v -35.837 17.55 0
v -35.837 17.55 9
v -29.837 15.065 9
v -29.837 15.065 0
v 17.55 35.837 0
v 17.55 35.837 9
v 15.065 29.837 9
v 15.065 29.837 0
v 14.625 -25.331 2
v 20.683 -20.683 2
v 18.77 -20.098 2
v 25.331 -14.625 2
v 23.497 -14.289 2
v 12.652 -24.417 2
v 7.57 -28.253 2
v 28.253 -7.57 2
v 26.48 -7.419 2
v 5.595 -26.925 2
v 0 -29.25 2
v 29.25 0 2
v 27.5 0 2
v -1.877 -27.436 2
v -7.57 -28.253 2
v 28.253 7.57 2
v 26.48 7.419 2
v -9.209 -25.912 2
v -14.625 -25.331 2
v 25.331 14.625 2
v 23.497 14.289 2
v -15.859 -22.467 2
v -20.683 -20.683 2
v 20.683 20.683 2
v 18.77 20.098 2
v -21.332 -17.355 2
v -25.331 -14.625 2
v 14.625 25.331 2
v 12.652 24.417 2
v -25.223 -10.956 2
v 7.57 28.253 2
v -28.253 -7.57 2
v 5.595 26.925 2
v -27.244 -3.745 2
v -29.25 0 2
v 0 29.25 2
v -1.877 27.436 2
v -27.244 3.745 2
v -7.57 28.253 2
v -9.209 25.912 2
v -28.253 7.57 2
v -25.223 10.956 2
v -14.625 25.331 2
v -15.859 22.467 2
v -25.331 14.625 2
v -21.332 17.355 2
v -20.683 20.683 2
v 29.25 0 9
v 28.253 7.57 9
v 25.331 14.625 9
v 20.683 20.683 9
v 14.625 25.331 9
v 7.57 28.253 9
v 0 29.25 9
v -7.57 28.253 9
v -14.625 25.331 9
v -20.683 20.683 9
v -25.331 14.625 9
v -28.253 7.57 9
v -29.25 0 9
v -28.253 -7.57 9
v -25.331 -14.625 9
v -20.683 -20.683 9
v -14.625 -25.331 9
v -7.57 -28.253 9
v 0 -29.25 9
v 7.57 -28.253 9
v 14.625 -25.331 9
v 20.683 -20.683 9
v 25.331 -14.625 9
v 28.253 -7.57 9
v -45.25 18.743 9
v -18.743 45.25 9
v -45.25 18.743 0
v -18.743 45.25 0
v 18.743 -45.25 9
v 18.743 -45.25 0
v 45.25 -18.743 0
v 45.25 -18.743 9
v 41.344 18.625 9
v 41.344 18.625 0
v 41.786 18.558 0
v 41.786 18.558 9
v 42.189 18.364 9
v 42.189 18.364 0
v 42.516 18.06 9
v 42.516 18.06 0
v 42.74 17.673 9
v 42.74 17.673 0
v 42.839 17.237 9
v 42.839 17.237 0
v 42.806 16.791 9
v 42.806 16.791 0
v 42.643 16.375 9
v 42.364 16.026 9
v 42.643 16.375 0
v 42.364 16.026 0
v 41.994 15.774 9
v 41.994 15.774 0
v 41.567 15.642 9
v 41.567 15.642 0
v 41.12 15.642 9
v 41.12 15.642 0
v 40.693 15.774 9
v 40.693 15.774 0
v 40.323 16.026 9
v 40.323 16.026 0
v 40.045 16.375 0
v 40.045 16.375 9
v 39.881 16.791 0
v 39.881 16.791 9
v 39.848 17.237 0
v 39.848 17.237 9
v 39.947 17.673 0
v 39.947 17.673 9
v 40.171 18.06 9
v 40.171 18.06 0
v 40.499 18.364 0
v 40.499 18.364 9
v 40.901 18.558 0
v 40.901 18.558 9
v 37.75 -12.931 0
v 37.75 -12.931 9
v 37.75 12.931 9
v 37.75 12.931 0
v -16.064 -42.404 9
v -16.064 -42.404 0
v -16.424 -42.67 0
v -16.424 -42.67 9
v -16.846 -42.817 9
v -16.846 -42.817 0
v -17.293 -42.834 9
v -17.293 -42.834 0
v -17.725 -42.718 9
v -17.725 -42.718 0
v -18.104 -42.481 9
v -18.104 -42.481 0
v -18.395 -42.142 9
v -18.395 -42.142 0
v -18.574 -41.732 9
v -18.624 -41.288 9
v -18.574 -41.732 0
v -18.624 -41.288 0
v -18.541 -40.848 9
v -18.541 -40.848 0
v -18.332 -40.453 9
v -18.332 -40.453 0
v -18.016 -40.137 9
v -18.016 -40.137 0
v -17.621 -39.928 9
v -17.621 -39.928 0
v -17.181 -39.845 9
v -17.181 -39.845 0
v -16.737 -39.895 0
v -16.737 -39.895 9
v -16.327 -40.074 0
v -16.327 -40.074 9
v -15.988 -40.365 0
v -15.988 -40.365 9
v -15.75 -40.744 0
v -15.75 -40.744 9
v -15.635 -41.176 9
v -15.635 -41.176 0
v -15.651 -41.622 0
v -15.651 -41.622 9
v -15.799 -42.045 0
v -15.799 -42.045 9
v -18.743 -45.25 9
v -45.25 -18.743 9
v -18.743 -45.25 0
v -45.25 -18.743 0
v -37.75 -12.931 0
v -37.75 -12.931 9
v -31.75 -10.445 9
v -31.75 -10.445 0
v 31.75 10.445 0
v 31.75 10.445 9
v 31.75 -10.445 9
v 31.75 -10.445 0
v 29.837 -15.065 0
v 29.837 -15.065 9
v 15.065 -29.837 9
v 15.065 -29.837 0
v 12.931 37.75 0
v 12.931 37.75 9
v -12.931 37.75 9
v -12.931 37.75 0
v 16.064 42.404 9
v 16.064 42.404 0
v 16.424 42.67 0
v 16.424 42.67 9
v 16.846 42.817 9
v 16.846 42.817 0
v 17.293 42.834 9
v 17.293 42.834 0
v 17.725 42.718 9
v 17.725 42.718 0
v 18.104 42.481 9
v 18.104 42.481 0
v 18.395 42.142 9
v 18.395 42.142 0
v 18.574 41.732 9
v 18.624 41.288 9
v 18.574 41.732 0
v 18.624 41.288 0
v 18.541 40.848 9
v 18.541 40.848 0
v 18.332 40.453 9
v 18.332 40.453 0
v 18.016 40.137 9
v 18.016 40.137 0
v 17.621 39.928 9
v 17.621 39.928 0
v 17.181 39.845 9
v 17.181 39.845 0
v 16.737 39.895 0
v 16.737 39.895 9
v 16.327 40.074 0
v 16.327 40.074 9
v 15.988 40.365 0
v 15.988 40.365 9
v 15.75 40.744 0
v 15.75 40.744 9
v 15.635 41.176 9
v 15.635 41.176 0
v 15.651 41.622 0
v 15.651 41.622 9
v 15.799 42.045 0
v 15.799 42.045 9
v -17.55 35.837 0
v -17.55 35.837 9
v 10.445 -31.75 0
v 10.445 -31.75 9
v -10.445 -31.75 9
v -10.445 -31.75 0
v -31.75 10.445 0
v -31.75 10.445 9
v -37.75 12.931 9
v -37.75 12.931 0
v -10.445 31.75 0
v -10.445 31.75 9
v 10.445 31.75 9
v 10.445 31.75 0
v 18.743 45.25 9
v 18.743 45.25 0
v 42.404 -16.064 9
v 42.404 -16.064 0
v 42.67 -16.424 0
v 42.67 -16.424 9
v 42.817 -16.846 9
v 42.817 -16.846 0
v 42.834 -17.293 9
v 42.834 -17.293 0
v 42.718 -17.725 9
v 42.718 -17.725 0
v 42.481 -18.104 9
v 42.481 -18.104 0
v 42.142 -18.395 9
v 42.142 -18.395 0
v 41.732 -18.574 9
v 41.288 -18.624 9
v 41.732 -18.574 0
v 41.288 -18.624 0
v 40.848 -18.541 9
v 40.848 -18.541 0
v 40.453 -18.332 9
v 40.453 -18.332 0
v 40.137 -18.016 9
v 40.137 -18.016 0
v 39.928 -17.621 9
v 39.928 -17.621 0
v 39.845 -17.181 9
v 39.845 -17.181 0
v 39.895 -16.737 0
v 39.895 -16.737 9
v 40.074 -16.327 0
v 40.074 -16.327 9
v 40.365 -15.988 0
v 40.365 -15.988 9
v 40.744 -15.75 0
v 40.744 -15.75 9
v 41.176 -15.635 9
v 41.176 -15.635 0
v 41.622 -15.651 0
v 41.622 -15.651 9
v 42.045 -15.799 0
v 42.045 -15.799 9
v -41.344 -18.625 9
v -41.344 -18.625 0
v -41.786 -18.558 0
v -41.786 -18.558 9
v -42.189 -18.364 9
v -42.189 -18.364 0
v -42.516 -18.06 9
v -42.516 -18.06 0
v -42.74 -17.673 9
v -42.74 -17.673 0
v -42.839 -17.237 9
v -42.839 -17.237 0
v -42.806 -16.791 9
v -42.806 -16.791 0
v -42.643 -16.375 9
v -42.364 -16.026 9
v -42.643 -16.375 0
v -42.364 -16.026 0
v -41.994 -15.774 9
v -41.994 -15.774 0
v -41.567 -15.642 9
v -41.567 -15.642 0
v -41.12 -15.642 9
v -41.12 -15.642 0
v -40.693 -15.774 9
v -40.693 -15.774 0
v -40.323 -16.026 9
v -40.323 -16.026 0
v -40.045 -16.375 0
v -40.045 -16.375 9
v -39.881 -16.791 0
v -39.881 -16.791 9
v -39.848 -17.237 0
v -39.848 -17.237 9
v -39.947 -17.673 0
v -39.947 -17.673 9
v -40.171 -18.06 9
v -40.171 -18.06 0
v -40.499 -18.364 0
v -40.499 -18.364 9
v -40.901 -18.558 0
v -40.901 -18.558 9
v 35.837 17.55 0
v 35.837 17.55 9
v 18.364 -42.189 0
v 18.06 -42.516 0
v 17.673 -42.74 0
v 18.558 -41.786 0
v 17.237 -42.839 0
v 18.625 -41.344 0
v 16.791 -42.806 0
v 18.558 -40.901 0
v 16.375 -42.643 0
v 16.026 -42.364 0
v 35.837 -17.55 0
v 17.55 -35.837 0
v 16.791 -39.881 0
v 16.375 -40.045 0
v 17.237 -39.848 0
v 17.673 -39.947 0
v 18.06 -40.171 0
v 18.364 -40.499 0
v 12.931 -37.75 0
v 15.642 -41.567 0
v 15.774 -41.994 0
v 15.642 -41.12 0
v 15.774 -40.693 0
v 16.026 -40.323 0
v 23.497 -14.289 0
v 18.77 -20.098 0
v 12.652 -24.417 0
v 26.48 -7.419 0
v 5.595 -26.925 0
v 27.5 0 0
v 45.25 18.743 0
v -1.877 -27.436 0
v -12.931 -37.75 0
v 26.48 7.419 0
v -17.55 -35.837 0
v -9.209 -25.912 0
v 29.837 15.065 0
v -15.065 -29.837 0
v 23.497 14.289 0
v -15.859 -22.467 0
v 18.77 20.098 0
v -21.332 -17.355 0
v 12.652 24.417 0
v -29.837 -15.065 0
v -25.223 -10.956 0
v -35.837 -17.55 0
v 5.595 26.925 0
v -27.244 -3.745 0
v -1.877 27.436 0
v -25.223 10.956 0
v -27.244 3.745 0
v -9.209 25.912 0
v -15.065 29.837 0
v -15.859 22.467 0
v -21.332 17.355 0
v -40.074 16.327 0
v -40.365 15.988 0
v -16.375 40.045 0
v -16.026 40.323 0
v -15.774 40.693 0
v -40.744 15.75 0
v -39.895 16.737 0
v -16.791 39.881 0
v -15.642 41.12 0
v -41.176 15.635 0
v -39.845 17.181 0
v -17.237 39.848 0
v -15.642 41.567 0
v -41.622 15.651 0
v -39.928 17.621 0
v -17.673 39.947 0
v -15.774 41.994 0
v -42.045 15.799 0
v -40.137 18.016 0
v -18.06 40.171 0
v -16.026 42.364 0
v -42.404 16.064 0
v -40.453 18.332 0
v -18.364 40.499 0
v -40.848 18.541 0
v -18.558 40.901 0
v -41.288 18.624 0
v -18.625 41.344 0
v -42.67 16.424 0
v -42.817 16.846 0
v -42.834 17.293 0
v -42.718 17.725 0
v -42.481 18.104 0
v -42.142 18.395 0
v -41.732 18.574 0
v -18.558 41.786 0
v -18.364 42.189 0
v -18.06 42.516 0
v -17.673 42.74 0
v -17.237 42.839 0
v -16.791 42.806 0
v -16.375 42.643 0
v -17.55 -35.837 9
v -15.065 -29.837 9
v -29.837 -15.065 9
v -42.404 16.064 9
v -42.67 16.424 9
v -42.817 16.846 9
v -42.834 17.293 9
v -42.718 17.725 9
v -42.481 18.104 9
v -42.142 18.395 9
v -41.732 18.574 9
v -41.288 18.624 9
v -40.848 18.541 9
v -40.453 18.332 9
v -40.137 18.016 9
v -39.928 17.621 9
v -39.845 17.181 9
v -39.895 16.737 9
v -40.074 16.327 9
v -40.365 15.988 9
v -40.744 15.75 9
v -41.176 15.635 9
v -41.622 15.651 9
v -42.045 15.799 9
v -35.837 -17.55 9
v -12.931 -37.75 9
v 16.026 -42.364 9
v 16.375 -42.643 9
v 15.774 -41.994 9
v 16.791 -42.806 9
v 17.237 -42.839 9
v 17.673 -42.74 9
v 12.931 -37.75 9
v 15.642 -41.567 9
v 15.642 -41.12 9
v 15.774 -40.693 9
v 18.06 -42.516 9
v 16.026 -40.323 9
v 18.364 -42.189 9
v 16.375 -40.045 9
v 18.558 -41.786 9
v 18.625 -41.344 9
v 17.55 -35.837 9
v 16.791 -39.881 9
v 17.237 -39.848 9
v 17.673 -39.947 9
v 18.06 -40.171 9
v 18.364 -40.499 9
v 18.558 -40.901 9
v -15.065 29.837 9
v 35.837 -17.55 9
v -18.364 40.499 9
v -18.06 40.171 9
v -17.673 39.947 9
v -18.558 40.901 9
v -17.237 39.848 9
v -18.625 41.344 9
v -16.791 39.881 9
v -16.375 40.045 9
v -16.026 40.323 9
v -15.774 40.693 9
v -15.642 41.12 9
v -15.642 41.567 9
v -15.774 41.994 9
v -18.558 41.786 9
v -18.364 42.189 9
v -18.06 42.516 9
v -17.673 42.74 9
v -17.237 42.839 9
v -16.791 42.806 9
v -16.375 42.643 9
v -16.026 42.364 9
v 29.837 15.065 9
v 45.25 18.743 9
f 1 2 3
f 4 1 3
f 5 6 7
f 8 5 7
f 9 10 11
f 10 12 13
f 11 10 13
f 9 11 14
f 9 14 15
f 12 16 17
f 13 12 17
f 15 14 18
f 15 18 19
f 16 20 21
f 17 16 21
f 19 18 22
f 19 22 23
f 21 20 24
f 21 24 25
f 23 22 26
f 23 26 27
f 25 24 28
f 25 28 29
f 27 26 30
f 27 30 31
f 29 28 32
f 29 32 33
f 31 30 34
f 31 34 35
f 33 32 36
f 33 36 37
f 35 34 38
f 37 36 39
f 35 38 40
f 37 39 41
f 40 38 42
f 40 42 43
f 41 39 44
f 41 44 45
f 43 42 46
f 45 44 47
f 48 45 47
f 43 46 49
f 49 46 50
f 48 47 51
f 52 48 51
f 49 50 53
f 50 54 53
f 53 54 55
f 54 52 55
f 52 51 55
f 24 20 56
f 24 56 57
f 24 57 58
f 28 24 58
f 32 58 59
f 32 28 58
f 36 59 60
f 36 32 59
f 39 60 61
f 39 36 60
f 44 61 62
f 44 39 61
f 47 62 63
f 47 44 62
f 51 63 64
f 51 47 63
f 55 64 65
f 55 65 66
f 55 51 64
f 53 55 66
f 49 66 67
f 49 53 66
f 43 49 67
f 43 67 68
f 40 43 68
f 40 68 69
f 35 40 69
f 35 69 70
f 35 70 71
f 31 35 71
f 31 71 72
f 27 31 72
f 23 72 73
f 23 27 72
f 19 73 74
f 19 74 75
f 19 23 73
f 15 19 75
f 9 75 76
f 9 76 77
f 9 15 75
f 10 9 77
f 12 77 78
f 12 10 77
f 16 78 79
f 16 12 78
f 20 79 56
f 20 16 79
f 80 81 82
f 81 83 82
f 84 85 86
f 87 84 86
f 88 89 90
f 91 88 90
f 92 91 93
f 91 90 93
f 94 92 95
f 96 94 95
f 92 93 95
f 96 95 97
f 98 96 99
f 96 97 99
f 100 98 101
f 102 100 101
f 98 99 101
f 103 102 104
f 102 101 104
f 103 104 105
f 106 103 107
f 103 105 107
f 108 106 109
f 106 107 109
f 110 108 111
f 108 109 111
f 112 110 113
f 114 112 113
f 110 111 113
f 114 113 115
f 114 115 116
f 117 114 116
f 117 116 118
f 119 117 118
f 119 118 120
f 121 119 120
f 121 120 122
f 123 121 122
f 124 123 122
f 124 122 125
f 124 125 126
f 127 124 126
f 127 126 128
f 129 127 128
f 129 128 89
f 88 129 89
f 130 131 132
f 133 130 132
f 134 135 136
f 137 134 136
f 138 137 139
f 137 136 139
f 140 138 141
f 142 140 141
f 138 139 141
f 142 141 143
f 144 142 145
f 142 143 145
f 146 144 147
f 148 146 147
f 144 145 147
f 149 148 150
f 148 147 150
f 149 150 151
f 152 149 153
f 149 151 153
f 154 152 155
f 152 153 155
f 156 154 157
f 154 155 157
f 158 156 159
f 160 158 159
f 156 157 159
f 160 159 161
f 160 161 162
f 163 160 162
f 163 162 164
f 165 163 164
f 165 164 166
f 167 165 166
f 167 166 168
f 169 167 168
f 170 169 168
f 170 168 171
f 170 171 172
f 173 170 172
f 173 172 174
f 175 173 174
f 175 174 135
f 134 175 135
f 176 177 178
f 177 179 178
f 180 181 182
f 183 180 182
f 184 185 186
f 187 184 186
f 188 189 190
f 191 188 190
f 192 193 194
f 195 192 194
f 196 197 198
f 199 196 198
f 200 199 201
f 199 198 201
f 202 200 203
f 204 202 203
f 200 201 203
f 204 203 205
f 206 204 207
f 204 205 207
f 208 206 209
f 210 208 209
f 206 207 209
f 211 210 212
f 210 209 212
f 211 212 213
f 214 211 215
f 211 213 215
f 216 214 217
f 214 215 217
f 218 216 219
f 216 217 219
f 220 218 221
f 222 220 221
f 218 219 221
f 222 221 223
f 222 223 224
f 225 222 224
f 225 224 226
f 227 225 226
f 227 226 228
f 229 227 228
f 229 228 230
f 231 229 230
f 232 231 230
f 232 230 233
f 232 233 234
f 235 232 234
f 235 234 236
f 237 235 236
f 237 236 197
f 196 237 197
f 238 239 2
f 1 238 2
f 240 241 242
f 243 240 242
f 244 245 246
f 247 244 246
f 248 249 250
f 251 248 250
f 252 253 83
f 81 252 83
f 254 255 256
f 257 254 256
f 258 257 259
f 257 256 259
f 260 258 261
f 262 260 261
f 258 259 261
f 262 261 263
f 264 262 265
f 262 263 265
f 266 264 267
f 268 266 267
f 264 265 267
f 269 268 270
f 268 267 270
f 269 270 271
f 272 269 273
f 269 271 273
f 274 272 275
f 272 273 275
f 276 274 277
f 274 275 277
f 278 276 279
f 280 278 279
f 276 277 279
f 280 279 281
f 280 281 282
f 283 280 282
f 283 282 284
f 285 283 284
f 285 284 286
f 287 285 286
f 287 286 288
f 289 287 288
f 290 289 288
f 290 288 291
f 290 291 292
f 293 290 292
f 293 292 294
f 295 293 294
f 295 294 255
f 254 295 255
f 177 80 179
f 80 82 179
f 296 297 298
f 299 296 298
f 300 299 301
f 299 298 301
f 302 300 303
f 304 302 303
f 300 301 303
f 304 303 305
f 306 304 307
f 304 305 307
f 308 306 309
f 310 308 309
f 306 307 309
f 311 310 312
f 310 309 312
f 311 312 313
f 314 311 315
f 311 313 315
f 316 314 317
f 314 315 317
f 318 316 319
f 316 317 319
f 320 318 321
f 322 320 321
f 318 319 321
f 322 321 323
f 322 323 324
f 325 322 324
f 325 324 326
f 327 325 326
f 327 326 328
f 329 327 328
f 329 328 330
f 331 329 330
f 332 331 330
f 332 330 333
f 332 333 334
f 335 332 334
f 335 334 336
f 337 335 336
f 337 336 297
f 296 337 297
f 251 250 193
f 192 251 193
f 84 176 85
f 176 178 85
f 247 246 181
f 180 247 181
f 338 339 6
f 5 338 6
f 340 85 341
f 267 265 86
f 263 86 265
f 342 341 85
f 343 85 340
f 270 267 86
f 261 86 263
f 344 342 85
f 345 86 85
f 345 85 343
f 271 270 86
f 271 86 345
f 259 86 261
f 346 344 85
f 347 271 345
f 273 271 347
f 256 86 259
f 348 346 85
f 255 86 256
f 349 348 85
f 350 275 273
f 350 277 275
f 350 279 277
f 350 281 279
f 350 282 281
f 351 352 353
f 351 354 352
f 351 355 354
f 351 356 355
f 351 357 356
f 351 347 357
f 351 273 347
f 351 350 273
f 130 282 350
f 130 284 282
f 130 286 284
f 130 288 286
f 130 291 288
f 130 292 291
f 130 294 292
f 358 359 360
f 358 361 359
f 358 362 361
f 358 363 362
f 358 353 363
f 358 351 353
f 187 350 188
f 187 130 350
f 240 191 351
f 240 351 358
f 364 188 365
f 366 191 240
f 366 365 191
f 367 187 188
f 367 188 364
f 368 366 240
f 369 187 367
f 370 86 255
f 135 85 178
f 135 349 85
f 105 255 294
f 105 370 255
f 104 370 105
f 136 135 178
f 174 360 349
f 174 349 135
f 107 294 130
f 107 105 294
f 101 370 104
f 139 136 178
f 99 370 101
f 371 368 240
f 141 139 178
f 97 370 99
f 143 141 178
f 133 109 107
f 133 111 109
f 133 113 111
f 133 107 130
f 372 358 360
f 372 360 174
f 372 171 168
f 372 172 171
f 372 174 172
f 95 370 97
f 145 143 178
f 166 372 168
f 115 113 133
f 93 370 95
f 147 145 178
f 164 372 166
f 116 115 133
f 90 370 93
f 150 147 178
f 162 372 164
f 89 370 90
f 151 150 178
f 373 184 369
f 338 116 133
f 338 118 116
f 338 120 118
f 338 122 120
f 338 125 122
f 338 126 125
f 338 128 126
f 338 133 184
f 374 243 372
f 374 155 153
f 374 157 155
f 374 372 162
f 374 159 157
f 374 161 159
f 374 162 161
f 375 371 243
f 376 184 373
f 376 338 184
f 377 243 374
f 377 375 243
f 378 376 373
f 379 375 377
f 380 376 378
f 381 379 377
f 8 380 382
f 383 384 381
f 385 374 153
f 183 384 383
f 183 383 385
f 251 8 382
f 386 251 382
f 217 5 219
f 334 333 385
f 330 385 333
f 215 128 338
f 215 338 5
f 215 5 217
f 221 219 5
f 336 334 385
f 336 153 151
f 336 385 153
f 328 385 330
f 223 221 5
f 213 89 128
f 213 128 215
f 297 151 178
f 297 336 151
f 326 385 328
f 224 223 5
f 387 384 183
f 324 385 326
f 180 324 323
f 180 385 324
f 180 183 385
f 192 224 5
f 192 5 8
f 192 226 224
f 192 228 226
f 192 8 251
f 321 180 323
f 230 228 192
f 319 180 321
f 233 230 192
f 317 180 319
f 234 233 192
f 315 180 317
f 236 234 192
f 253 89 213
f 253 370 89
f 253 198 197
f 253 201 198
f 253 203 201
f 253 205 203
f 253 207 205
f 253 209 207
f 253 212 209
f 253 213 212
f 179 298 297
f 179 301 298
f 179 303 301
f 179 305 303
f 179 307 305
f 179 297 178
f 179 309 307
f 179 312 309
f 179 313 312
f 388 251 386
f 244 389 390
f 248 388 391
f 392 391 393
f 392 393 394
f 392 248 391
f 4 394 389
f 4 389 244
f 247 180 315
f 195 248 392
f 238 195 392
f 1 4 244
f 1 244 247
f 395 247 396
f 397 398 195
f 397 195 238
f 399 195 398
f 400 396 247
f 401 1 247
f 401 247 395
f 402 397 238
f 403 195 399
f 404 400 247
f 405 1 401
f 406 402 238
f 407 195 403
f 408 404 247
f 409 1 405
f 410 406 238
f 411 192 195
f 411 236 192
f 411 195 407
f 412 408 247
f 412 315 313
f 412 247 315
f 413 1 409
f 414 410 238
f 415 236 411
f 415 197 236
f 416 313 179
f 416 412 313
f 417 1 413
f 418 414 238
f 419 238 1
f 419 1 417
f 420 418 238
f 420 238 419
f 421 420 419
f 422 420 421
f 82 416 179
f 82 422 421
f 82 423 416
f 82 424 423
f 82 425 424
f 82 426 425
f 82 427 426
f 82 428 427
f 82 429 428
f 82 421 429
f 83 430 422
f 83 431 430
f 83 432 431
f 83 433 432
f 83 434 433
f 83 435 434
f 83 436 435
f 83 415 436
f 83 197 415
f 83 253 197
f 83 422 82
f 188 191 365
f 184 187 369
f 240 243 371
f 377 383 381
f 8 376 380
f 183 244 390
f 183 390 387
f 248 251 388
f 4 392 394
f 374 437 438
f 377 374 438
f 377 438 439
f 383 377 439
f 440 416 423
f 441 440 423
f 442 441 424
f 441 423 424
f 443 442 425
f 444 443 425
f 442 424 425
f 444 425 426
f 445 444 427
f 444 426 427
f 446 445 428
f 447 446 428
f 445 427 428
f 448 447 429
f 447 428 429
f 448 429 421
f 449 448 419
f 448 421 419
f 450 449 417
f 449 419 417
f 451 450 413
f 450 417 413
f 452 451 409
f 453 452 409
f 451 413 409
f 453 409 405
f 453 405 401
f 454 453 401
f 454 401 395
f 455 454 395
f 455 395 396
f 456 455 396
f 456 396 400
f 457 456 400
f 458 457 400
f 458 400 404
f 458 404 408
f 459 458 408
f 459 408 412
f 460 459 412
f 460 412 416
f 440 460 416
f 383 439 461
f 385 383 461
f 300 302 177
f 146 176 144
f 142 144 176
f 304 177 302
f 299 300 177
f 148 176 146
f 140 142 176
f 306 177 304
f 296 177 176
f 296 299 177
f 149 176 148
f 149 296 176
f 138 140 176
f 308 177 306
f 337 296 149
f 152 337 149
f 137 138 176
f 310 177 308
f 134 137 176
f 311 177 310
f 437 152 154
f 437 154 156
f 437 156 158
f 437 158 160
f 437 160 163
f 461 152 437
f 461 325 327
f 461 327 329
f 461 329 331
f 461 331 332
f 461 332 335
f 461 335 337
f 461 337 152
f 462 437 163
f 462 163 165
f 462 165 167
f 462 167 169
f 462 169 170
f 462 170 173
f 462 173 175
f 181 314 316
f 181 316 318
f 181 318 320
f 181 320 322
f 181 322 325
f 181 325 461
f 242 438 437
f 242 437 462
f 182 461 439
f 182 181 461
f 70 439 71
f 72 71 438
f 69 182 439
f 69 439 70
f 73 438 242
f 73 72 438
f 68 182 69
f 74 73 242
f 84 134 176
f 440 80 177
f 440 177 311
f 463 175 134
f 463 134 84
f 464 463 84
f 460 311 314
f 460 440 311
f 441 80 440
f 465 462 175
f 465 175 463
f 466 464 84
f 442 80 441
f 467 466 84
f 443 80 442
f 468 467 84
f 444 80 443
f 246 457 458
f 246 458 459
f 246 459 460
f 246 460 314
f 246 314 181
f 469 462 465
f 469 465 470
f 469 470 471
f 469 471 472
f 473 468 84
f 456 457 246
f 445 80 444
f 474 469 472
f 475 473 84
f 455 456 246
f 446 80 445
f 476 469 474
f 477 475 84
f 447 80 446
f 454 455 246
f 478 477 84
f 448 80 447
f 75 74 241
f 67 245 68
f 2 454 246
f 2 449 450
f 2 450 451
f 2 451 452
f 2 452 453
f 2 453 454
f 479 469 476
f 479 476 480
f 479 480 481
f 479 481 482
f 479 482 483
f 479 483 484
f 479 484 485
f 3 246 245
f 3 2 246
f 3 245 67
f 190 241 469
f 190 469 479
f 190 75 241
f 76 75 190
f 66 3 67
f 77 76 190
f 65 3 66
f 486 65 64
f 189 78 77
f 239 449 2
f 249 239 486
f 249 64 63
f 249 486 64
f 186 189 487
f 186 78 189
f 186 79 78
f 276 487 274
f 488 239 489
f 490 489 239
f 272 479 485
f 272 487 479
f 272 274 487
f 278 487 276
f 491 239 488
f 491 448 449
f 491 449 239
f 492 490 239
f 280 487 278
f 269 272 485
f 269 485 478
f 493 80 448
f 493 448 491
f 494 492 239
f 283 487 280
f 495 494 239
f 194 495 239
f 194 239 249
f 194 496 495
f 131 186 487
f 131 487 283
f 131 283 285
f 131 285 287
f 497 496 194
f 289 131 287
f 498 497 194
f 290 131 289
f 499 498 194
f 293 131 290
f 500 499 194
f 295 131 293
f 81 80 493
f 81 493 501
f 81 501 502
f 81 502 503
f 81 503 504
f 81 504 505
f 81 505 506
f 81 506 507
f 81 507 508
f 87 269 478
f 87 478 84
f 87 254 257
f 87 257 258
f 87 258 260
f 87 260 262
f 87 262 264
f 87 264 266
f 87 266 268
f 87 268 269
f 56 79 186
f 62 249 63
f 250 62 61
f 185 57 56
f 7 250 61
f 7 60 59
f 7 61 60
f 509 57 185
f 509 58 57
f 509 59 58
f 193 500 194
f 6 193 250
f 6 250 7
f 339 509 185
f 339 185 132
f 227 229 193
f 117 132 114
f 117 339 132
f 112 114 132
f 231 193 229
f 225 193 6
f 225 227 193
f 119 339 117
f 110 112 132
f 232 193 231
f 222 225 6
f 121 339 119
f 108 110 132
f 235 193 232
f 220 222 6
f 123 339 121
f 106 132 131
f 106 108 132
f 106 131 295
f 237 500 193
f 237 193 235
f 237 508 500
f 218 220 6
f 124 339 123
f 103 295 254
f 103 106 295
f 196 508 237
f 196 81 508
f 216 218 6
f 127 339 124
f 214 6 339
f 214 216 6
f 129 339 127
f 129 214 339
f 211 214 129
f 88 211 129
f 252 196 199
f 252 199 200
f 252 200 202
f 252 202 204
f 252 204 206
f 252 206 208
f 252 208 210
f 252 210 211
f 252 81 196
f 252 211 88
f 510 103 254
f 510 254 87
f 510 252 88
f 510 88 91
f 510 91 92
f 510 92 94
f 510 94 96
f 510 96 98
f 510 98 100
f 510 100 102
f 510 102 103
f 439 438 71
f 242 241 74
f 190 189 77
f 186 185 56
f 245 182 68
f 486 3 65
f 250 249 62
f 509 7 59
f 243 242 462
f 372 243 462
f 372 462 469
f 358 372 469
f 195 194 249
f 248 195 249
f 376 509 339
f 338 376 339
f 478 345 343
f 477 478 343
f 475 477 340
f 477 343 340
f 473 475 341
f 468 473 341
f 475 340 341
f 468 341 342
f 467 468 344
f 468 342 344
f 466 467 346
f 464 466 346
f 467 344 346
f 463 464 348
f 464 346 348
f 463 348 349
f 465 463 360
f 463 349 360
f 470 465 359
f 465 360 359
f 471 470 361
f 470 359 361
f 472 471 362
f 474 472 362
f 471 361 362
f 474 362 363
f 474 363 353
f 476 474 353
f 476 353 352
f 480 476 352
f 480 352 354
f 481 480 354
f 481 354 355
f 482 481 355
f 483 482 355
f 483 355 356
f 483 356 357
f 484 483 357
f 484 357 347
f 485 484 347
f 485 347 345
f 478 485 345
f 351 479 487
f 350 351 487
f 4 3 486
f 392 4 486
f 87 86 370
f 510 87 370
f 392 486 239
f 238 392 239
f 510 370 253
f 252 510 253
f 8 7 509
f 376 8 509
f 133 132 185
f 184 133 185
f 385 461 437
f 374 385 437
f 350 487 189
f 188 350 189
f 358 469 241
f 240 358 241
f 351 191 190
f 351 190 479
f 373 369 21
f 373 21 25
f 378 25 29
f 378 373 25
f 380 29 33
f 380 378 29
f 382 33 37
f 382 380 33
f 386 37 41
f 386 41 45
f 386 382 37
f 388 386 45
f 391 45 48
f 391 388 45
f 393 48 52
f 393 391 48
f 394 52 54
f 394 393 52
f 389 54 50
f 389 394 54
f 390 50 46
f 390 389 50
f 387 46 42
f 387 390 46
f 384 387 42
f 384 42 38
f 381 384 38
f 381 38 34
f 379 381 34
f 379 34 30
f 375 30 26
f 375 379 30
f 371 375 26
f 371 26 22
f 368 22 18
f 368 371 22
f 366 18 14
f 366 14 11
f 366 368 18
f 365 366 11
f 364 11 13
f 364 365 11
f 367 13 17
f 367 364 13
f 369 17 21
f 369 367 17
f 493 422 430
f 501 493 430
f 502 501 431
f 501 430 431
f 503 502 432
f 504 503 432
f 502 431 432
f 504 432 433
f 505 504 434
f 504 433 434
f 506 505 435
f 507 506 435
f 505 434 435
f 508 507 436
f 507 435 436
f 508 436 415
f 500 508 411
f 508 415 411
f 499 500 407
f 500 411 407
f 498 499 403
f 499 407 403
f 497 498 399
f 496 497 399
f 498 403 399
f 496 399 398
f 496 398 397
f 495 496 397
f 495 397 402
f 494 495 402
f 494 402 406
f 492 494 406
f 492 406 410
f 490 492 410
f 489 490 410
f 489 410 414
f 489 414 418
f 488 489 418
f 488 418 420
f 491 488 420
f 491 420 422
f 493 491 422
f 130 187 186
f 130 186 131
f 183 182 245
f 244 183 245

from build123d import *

# Parameters (mm, degrees)
SKETCH1_R           = 27.5
BOSS_EXTRUDE1_DEPTH = 2
SKETCH2_R           = 29.25
BOSS_EXTRUDE2_DEPTH = 7
SKETCH3_R           = 1.5
CUT_EXTRUDE1_DEPTH  = 65.622944842
CIRPATTERN1_COUNT   = 8
CUT_EXTRUDE2_DEPTH  = 65.622944842
CIRPATTERN2_COUNT   = 8


with BuildPart() as part:
    # Sketch1 → Boss-Extrude1 (new body)
    with BuildSketch(Plane.XY):
        Polygon((-45.25, -18.743163697), (-45.25, 18.743163697), (-18.743163697, 45.25), (18.743163697, 45.25), (45.25, 18.743163697), (45.25, -18.743163697), (18.743163697, -45.25), (-18.743163697, -45.25), align=None)
        Circle(SKETCH1_R, mode=Mode.SUBTRACT)
    extrude(amount=BOSS_EXTRUDE1_DEPTH)

    # Sketch2 → Boss-Extrude2 (add)
    with BuildSketch(Plane.XY.offset(2)):
        Polygon((18.743163697, 45.25), (-18.743163697, 45.25), (-45.25, 18.743163697), (-45.25, -18.743163697), (-18.743163697, -45.25), (18.743163697, -45.25), (45.25, -18.743163697), (45.25, 18.743163697), align=None)
        Circle(SKETCH2_R, mode=Mode.SUBTRACT)
    extrude(amount=BOSS_EXTRUDE2_DEPTH)

    # Sketch3 → Cut-Extrude1 (cut, through all)
    with BuildSketch(Plane(origin=(0, 0, 0), x_dir=(-1, 0, 0), z_dir=(0, 0, -1))):
        with Locations((17.125083598, 41.34360908)):
            Circle(SKETCH3_R)
    cut_extrude1 = extrude(amount=-CUT_EXTRUDE1_DEPTH, mode=Mode.SUBTRACT)

    # CirPattern1: Cut-Extrude1 ×8 about axis
    cirpattern1_axis = Axis((0, 0, 0), (0, 0, 1))
    for i in range(1, CIRPATTERN1_COUNT):
        add(cut_extrude1.rotate(cirpattern1_axis, i * 360 / CIRPATTERN1_COUNT), mode=Mode.SUBTRACT)

    # Sketch6 → Cut-Extrude2 (cut, through all)
    with BuildSketch(Plane.XY.offset(9)):
        Polygon((-10.445300105, 31.75), (10.445300105, 31.75), (12.930581479, 37.75), (-12.930581479, 37.75), align=None)
    cut_extrude2 = extrude(amount=-CUT_EXTRUDE2_DEPTH, mode=Mode.SUBTRACT)

    # CirPattern2: Cut-Extrude2 ×8 about axis
    cirpattern2_axis = Axis((0, 0, 0), (0, 0, 1))
    for i in range(1, CIRPATTERN2_COUNT):
        add(cut_extrude2.rotate(cirpattern2_axis, i * 360 / CIRPATTERN2_COUNT), mode=Mode.SUBTRACT)


solid = part.part
